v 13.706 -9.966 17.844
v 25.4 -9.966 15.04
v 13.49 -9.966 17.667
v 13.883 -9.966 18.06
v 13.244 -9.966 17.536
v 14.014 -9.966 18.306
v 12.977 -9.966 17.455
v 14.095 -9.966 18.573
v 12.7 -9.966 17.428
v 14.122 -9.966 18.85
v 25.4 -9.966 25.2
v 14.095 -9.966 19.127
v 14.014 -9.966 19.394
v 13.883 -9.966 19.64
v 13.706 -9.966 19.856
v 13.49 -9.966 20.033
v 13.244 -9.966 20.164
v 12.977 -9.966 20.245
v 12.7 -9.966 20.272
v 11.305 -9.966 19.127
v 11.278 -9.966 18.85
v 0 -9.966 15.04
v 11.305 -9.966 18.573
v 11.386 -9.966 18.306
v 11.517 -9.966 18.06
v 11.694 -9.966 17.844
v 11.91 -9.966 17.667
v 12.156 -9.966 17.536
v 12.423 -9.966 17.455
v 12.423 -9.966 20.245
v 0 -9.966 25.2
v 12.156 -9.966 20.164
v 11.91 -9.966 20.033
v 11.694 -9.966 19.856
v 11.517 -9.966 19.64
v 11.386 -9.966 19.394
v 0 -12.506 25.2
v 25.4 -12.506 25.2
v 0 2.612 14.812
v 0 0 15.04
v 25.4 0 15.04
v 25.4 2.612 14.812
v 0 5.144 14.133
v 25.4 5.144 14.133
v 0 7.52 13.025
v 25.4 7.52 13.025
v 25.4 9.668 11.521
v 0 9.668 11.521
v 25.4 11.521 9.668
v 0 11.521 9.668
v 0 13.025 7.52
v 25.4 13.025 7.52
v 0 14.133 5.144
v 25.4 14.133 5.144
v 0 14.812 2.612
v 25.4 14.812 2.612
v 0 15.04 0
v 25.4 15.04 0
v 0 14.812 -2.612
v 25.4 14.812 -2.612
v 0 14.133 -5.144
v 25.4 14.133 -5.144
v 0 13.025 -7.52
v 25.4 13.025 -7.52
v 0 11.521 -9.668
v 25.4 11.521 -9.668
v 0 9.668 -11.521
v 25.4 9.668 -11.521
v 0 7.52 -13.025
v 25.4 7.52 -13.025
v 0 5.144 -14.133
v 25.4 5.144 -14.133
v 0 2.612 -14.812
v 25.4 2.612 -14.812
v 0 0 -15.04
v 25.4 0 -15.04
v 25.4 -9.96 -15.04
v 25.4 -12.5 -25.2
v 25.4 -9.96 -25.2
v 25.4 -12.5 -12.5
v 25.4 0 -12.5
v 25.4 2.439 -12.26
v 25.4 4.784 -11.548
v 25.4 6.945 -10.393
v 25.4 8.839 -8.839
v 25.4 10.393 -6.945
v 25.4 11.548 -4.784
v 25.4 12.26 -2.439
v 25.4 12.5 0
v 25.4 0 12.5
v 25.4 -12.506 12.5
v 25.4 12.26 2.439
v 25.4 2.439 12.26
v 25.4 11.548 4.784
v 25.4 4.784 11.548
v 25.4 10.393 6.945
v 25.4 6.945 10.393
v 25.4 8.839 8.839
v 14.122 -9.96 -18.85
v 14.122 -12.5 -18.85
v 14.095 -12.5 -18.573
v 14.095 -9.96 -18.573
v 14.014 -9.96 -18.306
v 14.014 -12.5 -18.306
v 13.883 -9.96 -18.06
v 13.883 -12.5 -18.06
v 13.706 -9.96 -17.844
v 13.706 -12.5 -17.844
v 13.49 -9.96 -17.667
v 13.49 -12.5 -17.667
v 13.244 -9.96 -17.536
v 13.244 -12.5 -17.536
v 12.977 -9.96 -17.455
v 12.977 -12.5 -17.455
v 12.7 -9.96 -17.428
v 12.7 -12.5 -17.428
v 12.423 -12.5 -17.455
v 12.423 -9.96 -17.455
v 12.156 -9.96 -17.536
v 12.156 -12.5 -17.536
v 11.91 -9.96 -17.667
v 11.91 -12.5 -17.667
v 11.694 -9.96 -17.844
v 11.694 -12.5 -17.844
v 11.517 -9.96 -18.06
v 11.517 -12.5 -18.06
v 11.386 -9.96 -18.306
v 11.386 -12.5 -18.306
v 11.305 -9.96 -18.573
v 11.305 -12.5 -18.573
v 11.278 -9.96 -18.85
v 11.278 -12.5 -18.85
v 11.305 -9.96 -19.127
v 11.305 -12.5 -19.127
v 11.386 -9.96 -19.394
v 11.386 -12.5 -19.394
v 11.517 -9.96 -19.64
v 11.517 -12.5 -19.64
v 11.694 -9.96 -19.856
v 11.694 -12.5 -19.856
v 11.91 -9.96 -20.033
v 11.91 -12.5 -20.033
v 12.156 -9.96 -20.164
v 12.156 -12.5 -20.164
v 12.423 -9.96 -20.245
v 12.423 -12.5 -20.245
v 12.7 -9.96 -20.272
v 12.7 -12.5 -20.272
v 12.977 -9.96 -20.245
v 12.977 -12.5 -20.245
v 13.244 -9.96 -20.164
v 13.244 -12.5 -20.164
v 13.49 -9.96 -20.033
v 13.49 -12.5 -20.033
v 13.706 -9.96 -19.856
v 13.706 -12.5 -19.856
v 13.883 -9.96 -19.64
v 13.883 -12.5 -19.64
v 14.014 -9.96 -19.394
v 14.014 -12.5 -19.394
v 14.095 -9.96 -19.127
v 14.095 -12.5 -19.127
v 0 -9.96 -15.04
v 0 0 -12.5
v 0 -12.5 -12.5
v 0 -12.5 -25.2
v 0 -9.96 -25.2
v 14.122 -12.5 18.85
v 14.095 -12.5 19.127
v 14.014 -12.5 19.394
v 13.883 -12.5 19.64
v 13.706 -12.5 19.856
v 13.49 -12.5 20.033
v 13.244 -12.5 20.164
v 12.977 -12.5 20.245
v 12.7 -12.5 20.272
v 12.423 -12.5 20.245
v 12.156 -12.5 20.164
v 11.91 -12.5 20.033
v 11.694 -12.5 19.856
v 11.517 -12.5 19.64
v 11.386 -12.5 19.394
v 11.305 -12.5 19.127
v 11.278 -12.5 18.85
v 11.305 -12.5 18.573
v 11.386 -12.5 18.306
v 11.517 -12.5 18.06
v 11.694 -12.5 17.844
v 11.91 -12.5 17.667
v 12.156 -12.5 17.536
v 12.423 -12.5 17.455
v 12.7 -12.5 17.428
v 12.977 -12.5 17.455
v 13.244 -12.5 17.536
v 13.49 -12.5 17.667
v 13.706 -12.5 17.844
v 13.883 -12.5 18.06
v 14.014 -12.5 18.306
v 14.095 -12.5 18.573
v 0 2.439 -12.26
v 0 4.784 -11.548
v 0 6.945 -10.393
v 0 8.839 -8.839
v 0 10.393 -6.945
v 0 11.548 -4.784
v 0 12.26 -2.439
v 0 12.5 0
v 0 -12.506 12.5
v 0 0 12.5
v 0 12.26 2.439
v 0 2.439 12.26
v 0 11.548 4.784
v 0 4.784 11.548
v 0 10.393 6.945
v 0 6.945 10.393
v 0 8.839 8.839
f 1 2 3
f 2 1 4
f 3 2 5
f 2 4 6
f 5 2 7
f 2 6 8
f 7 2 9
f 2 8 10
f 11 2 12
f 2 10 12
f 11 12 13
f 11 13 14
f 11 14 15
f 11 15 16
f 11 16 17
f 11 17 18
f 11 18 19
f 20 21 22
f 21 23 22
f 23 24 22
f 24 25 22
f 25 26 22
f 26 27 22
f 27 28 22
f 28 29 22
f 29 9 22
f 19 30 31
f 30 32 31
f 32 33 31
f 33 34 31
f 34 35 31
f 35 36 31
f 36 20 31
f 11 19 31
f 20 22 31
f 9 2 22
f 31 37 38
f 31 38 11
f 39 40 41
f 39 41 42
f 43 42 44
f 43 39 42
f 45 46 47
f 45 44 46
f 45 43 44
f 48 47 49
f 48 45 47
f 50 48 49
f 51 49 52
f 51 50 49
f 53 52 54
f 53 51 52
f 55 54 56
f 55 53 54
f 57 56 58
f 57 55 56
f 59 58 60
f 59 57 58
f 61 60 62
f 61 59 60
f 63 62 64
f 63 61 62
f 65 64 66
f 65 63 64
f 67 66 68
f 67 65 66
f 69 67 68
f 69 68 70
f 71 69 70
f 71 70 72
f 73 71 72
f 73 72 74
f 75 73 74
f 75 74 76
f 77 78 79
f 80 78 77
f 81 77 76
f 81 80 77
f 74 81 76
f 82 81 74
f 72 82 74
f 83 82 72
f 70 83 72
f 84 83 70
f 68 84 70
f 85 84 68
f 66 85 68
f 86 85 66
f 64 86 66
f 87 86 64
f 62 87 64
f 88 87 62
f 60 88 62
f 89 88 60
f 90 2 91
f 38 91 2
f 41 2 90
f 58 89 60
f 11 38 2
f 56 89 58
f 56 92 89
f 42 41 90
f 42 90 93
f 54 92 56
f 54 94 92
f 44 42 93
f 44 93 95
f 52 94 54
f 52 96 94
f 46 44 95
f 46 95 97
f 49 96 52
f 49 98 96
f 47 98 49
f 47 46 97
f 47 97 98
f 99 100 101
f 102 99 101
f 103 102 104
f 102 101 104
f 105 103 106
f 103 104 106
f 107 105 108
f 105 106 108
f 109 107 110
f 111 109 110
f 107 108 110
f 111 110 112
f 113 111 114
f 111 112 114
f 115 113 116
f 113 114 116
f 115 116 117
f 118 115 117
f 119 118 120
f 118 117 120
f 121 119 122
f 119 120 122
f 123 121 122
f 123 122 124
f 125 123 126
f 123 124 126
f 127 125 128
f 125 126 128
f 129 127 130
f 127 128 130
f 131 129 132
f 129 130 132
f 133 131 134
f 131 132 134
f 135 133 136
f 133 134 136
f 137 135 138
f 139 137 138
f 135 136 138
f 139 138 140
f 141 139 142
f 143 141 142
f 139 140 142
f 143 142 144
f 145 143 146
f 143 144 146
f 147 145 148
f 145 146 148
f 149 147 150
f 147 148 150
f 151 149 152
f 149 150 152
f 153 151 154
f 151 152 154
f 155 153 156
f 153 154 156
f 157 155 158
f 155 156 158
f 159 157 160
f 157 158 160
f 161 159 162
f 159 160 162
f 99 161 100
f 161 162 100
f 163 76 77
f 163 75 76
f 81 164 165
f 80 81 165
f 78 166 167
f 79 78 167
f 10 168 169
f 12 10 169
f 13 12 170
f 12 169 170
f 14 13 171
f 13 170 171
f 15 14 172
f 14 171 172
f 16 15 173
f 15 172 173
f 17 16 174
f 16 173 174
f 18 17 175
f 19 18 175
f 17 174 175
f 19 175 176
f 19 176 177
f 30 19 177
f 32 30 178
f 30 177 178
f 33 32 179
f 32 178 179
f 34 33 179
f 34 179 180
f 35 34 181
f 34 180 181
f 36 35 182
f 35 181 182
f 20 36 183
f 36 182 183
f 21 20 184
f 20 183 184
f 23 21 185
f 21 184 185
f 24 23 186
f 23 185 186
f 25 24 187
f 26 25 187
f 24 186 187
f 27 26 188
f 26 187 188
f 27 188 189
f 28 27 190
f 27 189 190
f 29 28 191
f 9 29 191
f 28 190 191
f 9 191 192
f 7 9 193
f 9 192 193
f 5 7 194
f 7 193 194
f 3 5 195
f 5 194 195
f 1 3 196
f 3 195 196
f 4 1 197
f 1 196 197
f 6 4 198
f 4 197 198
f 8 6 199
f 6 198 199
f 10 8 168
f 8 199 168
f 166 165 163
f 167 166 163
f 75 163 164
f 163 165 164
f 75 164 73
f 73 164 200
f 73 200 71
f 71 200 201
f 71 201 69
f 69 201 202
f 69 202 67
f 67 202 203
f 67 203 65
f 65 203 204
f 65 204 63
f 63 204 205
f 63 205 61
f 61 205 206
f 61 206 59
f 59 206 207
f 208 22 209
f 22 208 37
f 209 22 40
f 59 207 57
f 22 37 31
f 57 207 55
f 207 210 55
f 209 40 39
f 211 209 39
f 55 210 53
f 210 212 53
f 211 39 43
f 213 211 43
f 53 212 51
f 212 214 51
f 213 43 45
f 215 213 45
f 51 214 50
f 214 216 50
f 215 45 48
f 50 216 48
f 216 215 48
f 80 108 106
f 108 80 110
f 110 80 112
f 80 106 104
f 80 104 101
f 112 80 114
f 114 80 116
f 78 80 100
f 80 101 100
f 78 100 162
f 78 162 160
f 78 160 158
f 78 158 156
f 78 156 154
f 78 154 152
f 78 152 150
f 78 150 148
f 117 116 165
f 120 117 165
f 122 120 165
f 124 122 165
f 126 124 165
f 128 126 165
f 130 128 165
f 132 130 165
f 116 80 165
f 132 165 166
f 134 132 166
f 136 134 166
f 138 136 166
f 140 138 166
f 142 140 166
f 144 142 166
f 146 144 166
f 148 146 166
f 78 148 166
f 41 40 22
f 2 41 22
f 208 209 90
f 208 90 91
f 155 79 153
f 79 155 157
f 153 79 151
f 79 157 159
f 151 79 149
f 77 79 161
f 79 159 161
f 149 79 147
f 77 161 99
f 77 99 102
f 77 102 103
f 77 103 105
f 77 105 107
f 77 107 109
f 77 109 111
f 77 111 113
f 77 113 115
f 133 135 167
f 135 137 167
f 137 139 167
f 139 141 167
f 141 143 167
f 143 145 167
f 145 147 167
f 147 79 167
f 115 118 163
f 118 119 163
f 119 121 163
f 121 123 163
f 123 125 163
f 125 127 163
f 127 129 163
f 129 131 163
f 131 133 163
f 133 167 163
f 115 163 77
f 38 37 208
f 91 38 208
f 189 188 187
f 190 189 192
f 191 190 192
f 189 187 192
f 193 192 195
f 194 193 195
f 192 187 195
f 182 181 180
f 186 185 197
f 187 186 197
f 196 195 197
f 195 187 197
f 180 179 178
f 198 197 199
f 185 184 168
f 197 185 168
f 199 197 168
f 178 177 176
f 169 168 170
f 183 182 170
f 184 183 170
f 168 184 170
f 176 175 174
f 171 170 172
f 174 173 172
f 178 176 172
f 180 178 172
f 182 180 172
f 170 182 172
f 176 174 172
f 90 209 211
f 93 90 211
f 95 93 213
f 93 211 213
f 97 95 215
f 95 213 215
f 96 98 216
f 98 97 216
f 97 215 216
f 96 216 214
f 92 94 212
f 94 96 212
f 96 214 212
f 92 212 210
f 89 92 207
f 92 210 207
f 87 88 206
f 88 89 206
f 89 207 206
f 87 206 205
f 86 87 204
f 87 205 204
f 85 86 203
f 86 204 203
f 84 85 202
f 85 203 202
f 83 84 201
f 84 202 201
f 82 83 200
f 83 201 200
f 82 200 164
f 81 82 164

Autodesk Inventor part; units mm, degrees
ref_plane "YZ Plane" through (0, 0, 0) normal (1, 0, 0) x (0, 1, 0)
ref_plane "XZ Plane" through (0, 0, 0) normal (0, 1, 0) x (-1, 0, 0)
ref_plane "XY Plane" through (0, 0, 0) normal (0, 0, 1) x (1, 0, 0)
sketch "Sketch1" plane through (0, 0, 0) normal (1, 0, 0) x (0, 1, 0)
  arc A0 (0, -12.5) -> (0, 12.5) centre (0, 0) ccw
  line L0 (-12.5, -25.2) -> (-9.96, -25.2)
  line L1 (-9.96, -25.2) -> (-9.96, -15.04)
  line L2 (-12.5064, 25.2) -> (-9.9664, 25.2)
  line L3 (-12.5064, 25.2) -> (-12.5064, 12.5)
  line L4 (-12.5, -12.5) -> (-12.5, -25.2)
  line L5 (-9.9664, 15.04) -> (-9.9664, 25.2)
  arc A1 (0, -15.04) -> (0, 15.04) centre (0, 0) ccw
  line L6 (0, 15.04) -> (-9.9664, 15.04)
  line L7 (0, 12.5) -> (-12.5064, 12.5)
  line L8 (0, -12.5) -> (-12.5, -12.5)
  line L9 (0, -15.04) -> (-9.96, -15.04)
  point P0 (-4.98, -15)
  dimension "d0" = 25
  dimension "d9" = 12.7
  dimension "d10" = 12.7
  dimension "d11" = 2.54
  dimension "d12" = 2.54
  dimension "d15" = 2.54
  dimension "d17" = 0.0064
  dimension "d23" = 0
  dimension "d24" = 0
  dimension "d25" = 0
  dimension "d26" = 0
  dimension "d27" = 0.04
  dimension "d28" = 4.98
extrude "Extrusion1" add sketch "Sketch1" along normal blind 25.4
sketch "Sketch2" plane through (0, -12.5, -25.2) normal (0, -1, 0) x (1, 0, 0)
  circle A0 centre (12.7, 44.05) radius 1.4224
  circle A1 centre (12.7, 6.35) radius 1.4224
  line L0 (0, 50.4) -> (25.4, 50.4) projected
  line L1 (25.4, 50.4) -> (25.4, 37.7) projected
  line L2 (0, 0) -> (25.4, 0) projected
  point P0 (0, 25.2)
  dimension "d31" = 2.8448
  dimension "d32" = 6.35
  dimension "d33" = 12.7
  dimension "d34" = 0
  dimension "d35" = 6.35
  dimension "d36" = 2.8448
extrude "Extrusion2" cut sketch "Sketch2" against normal blind 25.4
properties part number "Motor mount"
